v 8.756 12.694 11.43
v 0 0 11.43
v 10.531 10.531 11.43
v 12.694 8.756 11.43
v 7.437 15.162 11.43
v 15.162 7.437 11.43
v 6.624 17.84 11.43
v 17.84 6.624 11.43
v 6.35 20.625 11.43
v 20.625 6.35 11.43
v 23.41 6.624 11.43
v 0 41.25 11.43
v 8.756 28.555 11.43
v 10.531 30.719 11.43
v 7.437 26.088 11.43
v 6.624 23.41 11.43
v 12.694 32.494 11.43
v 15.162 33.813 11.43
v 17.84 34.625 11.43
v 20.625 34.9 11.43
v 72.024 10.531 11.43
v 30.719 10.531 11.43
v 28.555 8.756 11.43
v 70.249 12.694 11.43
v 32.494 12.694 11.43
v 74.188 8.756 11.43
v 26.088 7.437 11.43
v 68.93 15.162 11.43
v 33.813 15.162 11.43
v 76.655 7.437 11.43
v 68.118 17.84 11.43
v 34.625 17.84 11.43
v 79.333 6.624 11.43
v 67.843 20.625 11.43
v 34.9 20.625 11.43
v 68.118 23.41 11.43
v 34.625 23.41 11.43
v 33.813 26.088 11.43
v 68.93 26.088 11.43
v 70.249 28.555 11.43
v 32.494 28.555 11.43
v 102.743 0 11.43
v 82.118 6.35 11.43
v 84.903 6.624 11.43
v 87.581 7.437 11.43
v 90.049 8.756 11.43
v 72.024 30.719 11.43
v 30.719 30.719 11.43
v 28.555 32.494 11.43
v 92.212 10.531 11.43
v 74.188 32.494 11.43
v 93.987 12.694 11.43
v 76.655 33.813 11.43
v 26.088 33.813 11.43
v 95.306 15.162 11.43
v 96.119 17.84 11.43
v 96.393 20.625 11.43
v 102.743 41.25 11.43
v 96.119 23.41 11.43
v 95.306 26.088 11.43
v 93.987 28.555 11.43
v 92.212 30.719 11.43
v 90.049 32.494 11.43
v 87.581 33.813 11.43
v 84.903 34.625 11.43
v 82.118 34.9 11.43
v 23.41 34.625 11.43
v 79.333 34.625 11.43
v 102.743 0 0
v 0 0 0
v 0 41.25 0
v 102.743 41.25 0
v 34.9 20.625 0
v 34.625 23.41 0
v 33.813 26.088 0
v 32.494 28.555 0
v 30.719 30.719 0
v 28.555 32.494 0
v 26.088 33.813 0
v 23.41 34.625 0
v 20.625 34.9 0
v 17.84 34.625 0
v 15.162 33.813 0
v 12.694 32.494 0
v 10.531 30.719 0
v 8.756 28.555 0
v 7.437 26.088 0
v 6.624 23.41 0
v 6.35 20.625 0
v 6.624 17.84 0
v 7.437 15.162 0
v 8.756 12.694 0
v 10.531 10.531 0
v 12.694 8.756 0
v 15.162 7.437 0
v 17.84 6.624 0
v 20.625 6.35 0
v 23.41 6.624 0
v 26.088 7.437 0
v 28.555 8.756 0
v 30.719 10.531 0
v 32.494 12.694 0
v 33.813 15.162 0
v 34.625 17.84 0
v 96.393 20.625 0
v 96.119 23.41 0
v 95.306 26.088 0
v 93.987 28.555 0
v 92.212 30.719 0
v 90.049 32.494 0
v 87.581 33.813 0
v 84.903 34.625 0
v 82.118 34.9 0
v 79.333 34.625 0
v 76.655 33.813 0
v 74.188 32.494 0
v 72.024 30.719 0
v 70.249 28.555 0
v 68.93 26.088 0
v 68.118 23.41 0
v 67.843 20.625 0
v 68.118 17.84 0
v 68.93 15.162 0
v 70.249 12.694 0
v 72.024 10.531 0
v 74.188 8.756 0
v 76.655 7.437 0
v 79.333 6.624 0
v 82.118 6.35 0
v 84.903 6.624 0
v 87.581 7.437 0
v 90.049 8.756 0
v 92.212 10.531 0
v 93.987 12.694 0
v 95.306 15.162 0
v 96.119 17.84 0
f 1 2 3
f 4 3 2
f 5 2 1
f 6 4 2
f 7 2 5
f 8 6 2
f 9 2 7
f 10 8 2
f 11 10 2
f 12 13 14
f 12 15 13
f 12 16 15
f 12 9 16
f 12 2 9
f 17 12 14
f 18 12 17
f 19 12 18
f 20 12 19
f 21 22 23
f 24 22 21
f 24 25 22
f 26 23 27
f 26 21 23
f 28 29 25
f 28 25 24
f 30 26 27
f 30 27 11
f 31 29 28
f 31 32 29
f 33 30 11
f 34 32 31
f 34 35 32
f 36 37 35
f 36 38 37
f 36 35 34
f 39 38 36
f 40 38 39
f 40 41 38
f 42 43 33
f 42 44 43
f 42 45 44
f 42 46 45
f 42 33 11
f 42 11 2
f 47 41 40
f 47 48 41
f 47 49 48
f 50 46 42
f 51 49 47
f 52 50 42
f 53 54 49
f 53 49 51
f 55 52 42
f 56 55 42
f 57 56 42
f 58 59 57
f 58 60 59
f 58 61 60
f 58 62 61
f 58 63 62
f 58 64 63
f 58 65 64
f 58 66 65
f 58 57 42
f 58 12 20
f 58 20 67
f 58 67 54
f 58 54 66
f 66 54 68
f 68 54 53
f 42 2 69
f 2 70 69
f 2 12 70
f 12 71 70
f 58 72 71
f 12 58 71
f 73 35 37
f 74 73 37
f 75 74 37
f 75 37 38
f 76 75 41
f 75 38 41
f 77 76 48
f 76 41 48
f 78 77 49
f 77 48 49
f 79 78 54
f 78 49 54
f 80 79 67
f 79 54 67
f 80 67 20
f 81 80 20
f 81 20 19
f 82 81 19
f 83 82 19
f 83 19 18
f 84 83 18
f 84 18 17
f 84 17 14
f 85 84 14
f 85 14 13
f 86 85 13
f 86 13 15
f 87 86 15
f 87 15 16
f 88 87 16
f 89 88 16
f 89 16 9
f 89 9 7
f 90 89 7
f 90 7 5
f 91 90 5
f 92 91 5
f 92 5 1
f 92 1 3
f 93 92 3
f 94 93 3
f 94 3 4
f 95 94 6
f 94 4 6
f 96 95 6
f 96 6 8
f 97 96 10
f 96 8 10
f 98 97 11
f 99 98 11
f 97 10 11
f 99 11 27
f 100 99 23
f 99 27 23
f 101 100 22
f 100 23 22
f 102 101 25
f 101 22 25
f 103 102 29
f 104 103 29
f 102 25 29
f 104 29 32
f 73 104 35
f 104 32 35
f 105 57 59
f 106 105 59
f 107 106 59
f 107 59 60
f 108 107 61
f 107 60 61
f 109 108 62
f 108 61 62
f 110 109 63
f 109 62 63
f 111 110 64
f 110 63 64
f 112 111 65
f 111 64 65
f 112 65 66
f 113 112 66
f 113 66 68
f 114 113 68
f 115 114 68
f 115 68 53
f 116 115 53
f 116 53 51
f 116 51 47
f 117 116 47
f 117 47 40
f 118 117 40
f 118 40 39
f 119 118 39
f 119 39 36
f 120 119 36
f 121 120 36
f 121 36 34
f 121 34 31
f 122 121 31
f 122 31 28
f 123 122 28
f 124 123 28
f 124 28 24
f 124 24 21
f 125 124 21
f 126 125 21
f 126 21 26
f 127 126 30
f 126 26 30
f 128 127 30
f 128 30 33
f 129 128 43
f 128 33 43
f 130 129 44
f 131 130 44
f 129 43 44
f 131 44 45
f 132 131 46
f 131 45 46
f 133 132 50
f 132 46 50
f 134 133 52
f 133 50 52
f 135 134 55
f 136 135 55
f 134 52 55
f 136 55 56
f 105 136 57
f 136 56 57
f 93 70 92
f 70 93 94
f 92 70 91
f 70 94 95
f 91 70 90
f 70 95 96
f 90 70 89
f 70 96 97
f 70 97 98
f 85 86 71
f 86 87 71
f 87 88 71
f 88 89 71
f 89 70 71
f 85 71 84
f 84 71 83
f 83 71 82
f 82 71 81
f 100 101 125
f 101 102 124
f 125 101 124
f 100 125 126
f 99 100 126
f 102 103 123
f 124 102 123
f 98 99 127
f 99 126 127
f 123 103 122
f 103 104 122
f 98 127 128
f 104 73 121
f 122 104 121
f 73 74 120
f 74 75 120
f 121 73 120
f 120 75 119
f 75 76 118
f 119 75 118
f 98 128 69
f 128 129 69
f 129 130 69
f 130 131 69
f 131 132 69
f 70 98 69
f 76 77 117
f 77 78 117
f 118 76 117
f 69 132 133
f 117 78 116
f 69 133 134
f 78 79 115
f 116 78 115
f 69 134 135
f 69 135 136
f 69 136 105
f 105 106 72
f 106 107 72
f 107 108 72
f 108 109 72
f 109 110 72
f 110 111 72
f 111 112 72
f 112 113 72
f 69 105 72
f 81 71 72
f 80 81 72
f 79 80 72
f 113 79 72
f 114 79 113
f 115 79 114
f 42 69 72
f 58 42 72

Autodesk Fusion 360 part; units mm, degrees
sketch "Sketch1" plane through (0, 0, 0) normal (0, 0, 1) x (1, 0, 0) in component "Component"
  line L0 (0, 0) -> (102.743, 0)
  line L1 (102.743, 0) -> (102.743, 41.2496)
  line L2 (102.743, 41.2496) -> (0, 41.2496)
  line L3 (0, 41.2496) -> (0, 0)
  dimension "d1" = 41.2496
  dimension "d10" = 102.743
extrude "Extrude1" add sketch "Sketch1" along normal blind 11.43 in component "Component"
sketch "Sketch2" plane through (0, 0, 11.43) normal (0, 0, 1) x (1, 0, 0) in component "Component"
  line L0 (0, 41.2496) -> (0, 0)
  line L1 (0, 0) -> (102.743, 0)
  line L2 (102.743, 0) -> (102.743, 41.2496)
  line L3 (102.743, 41.2496) -> (0, 41.2496)
  circle A0 centre (20.6248, 20.6248) radius 14.2748
  circle A1 centre (82.1182, 20.6248) radius 14.2748
  dimension "d4" = 28.5496
  dimension "d5" = 28.5496
  dimension "d6" = 20.6248
  dimension "d7" = 20.6248
  dimension "d8" = 20.6248
  dimension "d9" = 61.4934
extrude "Extrude2" cut sketch "Sketch2" against normal blind 11.43 contours A0 | A1 in component "Component"
component "Component" placed x (1, 0, 0) y (0, 1, 0) z (0, 0, 1) at (0, 0, 0)
